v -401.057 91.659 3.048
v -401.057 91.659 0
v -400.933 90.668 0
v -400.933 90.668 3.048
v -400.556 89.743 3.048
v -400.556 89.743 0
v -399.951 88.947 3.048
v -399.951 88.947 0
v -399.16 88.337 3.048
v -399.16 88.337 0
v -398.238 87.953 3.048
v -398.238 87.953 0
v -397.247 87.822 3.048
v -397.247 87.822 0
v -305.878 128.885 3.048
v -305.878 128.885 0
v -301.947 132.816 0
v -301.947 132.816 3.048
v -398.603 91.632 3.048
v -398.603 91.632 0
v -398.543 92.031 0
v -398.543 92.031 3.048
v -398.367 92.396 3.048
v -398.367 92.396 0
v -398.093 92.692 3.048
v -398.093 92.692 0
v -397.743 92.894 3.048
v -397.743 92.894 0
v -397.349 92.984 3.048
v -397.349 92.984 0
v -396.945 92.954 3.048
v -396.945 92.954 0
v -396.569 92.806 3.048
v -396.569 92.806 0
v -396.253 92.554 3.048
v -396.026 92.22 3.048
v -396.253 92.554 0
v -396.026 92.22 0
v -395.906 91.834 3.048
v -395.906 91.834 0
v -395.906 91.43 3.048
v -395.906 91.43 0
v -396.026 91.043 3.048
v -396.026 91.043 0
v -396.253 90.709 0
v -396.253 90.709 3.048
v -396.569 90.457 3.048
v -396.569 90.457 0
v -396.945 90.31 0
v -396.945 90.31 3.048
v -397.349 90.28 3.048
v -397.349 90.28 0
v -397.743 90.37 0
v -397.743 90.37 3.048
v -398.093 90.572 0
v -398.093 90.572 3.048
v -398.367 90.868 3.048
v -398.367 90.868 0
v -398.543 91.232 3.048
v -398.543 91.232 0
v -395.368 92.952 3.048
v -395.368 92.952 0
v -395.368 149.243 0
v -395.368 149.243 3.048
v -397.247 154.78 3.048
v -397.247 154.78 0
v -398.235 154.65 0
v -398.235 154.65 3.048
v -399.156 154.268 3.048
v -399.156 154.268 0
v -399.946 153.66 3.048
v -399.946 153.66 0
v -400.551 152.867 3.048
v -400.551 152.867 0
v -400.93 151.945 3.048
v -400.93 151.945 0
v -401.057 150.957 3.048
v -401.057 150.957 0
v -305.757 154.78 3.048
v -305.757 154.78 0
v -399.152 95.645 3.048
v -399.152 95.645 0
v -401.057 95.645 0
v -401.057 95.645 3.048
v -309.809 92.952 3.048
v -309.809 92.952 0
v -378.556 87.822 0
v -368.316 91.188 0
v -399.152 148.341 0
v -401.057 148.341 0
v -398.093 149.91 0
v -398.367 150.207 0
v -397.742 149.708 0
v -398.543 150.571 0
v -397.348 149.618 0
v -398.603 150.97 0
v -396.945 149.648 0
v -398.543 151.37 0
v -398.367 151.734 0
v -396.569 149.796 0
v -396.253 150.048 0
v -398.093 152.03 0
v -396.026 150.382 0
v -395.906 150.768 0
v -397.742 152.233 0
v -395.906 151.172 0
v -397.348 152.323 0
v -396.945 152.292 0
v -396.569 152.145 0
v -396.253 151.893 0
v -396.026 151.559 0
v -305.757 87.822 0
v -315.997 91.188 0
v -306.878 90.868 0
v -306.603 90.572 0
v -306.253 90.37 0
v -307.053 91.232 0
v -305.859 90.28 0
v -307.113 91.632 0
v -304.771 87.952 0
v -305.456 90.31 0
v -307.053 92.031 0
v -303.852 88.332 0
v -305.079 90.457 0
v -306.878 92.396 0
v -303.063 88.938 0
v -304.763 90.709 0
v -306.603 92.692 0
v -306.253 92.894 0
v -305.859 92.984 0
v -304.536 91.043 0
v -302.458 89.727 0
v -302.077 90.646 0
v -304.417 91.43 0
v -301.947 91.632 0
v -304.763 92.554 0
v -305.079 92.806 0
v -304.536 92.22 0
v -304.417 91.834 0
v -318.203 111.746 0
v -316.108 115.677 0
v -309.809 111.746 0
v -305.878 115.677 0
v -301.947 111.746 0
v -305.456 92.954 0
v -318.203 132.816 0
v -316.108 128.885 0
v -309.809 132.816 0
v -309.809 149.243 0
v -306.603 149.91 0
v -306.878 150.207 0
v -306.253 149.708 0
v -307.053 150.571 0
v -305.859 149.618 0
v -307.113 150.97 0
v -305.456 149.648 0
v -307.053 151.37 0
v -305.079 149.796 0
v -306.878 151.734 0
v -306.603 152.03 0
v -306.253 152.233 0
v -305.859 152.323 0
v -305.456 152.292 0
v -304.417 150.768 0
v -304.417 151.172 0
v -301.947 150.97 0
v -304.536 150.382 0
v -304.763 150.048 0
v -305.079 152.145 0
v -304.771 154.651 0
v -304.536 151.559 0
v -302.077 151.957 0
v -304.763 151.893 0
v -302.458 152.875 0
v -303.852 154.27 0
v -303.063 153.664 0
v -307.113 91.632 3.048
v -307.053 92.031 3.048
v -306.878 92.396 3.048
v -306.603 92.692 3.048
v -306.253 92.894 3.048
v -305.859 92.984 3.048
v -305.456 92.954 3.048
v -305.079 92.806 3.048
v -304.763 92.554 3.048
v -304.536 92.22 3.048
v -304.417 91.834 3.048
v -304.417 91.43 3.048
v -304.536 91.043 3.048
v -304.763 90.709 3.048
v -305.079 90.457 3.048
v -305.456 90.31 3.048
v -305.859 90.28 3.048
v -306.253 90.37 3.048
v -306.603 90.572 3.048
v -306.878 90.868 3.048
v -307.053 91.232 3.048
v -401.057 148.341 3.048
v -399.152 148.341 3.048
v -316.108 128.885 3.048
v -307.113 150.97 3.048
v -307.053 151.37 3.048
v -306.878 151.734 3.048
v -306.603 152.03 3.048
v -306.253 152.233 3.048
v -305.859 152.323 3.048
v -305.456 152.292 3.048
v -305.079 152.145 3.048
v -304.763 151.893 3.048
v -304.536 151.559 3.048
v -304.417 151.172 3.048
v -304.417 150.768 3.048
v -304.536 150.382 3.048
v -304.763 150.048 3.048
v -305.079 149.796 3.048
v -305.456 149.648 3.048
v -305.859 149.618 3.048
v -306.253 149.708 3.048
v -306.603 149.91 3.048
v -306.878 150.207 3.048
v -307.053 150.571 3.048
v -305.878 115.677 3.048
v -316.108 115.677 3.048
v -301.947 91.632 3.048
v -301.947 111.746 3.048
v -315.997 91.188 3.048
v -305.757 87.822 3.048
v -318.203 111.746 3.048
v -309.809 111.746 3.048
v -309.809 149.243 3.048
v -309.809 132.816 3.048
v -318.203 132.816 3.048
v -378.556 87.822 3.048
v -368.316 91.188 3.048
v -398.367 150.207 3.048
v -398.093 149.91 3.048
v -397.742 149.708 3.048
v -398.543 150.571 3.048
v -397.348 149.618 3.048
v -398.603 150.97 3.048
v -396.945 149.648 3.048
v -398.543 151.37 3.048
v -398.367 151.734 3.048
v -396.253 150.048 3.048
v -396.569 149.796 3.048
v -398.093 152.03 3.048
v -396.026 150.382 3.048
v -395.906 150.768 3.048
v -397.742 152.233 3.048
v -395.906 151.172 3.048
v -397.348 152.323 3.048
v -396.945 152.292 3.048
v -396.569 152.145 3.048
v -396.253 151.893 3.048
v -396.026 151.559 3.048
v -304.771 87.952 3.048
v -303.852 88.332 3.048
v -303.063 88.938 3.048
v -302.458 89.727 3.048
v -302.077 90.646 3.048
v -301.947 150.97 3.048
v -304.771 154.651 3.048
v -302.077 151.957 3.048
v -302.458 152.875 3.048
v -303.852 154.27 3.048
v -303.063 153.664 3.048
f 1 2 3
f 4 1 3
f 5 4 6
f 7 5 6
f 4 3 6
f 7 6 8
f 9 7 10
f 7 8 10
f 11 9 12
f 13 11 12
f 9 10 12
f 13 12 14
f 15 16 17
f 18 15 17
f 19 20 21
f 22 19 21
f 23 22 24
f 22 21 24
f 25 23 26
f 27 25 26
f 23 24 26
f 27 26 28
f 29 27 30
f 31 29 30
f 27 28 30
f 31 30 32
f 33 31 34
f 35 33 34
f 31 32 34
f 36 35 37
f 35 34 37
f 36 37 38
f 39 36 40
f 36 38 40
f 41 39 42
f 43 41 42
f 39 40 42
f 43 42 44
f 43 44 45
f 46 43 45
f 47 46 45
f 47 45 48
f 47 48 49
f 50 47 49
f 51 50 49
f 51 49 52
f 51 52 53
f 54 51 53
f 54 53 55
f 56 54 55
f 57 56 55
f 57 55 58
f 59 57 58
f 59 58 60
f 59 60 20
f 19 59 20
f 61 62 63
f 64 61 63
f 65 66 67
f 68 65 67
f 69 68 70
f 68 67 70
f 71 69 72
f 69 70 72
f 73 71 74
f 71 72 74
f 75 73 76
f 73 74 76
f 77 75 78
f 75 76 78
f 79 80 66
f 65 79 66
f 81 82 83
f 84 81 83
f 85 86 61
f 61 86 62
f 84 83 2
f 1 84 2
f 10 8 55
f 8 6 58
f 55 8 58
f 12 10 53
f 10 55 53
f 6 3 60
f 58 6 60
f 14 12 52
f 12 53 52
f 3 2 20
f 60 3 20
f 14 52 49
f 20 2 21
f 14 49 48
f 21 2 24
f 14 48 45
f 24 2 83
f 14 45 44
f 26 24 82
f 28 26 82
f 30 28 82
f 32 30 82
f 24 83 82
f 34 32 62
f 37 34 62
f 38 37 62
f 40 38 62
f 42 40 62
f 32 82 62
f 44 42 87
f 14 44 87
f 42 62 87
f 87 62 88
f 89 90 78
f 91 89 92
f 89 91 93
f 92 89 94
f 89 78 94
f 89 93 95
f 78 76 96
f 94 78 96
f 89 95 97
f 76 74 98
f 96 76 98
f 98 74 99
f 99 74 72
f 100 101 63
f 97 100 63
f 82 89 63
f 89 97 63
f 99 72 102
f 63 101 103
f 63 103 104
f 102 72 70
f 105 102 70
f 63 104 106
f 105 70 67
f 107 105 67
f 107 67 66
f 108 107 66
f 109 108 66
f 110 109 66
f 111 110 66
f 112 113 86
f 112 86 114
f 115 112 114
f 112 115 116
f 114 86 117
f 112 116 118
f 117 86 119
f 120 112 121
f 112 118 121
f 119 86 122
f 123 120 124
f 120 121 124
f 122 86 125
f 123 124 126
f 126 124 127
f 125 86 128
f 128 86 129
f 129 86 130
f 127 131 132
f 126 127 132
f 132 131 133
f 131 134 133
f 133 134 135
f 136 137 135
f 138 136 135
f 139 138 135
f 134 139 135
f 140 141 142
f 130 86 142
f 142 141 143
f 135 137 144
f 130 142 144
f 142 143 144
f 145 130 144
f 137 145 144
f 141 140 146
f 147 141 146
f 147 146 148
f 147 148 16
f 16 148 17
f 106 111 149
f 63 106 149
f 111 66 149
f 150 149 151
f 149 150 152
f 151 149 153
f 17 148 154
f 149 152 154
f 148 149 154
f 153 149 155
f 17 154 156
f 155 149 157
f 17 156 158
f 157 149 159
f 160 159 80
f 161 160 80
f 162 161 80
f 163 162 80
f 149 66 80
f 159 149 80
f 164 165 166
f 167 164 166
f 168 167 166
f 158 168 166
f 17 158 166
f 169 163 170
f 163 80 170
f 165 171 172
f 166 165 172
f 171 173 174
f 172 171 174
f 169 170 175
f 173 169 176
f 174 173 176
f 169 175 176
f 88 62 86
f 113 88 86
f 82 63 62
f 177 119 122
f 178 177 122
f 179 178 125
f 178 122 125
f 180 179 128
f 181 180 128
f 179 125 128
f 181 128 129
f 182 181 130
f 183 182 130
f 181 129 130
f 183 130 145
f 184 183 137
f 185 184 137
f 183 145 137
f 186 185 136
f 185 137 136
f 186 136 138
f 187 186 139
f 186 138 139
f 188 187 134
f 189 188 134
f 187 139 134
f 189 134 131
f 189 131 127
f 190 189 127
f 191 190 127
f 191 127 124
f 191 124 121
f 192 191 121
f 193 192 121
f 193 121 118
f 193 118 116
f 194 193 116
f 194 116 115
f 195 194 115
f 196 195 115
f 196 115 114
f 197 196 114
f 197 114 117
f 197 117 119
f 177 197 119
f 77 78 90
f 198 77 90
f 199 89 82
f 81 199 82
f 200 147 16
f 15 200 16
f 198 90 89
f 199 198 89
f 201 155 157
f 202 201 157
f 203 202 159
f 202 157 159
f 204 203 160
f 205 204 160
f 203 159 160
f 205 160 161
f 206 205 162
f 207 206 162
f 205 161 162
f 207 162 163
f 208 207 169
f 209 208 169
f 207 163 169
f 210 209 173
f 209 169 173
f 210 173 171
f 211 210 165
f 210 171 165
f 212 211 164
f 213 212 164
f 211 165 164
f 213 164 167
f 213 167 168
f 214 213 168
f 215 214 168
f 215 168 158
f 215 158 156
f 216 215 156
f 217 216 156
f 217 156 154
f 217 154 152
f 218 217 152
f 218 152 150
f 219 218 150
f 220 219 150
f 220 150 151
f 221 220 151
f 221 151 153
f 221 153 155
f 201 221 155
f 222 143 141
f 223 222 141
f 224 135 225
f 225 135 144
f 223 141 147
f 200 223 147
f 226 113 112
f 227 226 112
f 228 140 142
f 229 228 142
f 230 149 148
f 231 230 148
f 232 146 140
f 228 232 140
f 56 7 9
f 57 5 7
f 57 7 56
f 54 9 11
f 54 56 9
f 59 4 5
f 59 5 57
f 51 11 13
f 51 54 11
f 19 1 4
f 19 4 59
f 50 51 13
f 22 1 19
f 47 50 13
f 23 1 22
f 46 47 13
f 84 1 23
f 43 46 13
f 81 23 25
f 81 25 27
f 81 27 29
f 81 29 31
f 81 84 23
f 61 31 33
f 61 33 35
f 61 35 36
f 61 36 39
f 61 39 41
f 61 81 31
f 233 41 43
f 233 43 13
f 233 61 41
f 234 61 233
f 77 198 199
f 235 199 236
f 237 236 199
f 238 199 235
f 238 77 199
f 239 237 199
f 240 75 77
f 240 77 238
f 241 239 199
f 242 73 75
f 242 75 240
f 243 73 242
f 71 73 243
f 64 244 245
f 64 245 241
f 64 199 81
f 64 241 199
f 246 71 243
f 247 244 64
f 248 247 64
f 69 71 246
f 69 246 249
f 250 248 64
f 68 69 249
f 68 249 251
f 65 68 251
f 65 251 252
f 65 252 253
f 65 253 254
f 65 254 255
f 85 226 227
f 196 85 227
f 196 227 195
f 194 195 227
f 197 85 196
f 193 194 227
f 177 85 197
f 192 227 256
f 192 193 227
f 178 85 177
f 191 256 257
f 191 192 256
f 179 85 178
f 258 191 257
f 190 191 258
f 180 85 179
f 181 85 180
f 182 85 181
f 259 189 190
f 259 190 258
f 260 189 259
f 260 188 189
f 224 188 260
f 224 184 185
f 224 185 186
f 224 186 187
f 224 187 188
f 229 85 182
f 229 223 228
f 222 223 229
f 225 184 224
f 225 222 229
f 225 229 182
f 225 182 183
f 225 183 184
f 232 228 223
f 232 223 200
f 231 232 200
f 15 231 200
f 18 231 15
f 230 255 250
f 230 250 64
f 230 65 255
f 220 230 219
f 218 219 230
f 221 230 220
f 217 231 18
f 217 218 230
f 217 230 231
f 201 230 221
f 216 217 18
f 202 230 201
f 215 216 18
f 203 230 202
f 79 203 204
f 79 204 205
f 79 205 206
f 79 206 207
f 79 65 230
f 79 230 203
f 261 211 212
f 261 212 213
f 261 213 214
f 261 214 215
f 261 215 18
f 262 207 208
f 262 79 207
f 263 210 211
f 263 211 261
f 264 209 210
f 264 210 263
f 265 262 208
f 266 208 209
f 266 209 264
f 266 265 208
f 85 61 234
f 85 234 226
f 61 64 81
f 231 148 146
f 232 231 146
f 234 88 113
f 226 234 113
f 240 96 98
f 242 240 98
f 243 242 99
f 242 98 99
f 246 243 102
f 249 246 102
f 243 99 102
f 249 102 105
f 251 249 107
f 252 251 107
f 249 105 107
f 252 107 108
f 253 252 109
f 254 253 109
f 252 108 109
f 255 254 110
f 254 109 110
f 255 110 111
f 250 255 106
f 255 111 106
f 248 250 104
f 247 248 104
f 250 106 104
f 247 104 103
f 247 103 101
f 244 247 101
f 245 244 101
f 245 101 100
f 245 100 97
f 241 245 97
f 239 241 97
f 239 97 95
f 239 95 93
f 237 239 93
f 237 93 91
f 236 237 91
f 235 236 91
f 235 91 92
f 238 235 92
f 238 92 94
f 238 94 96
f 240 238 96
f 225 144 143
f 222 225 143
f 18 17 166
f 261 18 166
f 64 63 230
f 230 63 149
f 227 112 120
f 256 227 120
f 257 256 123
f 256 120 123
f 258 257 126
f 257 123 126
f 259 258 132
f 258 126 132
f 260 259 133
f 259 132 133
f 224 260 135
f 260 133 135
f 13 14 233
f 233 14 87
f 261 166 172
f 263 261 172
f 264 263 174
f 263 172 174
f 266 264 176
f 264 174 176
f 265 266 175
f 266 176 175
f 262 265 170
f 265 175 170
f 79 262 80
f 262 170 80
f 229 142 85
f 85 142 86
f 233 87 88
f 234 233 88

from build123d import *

# Parameters (mm, degrees)
BOSS_EXTRUDE1_DEPTH = 3.048
SKETCH2_R           = 1.355900406
CUT_EXTRUDE1_DEPTH  = 430.898988368


with BuildPart() as part:
    # Sketch1 → Boss-Extrude1 (new body)
    with BuildSketch(Plane.XY):
        with BuildLine():
            Line((-309.8086, 128.8851), (-305.87795, 128.8851))
            Line((-305.87795, 128.8851), (-301.9473, 132.81575))
            Line((-301.9473, 132.81575), (-301.9473, 150.9704))
            ThreePointArc((-301.9473, 150.9704), (-303.063223164, 153.664476836), (-305.7573, 154.7804))
            Line((-305.7573, 154.7804), (-397.247125, 154.7804))
            ThreePointArc((-397.247125, 154.7804), (-399.946077222, 153.659592612), (-401.0571, 150.956597849))
            Line((-401.0571, 150.956597849), (-401.0571, 148.341))
            Line((-401.0571, 148.341), (-399.1521, 148.341))
            Line((-399.1521, 148.341), (-399.1521, 95.6449))
            Line((-399.1521, 95.6449), (-401.0571, 95.6449))
            Line((-401.0571, 95.6449), (-401.0571, 91.659304166))
            ThreePointArc((-401.0571, 91.659304166), (-399.951018769, 88.947400452), (-397.2472, 87.8217))
            Line((-397.2472, 87.8217), (-378.5565, 87.8217))
            Line((-378.5565, 87.8217), (-368.3165, 91.1883))
            Line((-368.3165, 91.1883), (-315.9973, 91.1883))
            Line((-315.9973, 91.1883), (-305.7573, 87.8217))
            ThreePointArc((-305.7573, 87.8217), (-303.063223164, 88.937623164), (-301.9473, 91.6317))
            Line((-301.9473, 91.6317), (-301.9473, 111.74645))
            Line((-301.9473, 111.74645), (-305.87795, 115.6771))
            Line((-305.87795, 115.6771), (-309.8086, 115.6771))
            Line((-309.8086, 115.6771), (-316.1078, 115.6771))
            Line((-316.1078, 115.6771), (-316.1078, 128.8851))
            Line((-316.1078, 128.8851), (-309.8086, 128.8851))
        make_face()
        Polygon((-395.3675, 92.9525), (-395.3675, 149.2432), (-309.8086, 149.2432), (-309.8086, 132.81575), (-318.2033, 132.81575), (-318.2033, 111.74645), (-309.8086, 111.74645), (-309.8086, 92.9525), align=None, mode=Mode.SUBTRACT)
    extrude(amount=BOSS_EXTRUDE1_DEPTH)

    # Sketch2 → Cut-Extrude1 (cut, through all)
    with BuildSketch(Plane(origin=(0, 0, 0), x_dir=(-1, 0, 0), z_dir=(0, 0, -1))):
        with Locations((305.7573, 150.9704)):
            Circle(SKETCH2_R)
        with Locations((397.247125, 150.9704)):
            Circle(SKETCH2_R)
        with Locations((397.2472, 91.6317)):
            Circle(SKETCH2_R)
        with Locations((305.7573, 91.6317)):
            Circle(SKETCH2_R)
    extrude(amount=-CUT_EXTRUDE1_DEPTH, mode=Mode.SUBTRACT)


solid = part.part
